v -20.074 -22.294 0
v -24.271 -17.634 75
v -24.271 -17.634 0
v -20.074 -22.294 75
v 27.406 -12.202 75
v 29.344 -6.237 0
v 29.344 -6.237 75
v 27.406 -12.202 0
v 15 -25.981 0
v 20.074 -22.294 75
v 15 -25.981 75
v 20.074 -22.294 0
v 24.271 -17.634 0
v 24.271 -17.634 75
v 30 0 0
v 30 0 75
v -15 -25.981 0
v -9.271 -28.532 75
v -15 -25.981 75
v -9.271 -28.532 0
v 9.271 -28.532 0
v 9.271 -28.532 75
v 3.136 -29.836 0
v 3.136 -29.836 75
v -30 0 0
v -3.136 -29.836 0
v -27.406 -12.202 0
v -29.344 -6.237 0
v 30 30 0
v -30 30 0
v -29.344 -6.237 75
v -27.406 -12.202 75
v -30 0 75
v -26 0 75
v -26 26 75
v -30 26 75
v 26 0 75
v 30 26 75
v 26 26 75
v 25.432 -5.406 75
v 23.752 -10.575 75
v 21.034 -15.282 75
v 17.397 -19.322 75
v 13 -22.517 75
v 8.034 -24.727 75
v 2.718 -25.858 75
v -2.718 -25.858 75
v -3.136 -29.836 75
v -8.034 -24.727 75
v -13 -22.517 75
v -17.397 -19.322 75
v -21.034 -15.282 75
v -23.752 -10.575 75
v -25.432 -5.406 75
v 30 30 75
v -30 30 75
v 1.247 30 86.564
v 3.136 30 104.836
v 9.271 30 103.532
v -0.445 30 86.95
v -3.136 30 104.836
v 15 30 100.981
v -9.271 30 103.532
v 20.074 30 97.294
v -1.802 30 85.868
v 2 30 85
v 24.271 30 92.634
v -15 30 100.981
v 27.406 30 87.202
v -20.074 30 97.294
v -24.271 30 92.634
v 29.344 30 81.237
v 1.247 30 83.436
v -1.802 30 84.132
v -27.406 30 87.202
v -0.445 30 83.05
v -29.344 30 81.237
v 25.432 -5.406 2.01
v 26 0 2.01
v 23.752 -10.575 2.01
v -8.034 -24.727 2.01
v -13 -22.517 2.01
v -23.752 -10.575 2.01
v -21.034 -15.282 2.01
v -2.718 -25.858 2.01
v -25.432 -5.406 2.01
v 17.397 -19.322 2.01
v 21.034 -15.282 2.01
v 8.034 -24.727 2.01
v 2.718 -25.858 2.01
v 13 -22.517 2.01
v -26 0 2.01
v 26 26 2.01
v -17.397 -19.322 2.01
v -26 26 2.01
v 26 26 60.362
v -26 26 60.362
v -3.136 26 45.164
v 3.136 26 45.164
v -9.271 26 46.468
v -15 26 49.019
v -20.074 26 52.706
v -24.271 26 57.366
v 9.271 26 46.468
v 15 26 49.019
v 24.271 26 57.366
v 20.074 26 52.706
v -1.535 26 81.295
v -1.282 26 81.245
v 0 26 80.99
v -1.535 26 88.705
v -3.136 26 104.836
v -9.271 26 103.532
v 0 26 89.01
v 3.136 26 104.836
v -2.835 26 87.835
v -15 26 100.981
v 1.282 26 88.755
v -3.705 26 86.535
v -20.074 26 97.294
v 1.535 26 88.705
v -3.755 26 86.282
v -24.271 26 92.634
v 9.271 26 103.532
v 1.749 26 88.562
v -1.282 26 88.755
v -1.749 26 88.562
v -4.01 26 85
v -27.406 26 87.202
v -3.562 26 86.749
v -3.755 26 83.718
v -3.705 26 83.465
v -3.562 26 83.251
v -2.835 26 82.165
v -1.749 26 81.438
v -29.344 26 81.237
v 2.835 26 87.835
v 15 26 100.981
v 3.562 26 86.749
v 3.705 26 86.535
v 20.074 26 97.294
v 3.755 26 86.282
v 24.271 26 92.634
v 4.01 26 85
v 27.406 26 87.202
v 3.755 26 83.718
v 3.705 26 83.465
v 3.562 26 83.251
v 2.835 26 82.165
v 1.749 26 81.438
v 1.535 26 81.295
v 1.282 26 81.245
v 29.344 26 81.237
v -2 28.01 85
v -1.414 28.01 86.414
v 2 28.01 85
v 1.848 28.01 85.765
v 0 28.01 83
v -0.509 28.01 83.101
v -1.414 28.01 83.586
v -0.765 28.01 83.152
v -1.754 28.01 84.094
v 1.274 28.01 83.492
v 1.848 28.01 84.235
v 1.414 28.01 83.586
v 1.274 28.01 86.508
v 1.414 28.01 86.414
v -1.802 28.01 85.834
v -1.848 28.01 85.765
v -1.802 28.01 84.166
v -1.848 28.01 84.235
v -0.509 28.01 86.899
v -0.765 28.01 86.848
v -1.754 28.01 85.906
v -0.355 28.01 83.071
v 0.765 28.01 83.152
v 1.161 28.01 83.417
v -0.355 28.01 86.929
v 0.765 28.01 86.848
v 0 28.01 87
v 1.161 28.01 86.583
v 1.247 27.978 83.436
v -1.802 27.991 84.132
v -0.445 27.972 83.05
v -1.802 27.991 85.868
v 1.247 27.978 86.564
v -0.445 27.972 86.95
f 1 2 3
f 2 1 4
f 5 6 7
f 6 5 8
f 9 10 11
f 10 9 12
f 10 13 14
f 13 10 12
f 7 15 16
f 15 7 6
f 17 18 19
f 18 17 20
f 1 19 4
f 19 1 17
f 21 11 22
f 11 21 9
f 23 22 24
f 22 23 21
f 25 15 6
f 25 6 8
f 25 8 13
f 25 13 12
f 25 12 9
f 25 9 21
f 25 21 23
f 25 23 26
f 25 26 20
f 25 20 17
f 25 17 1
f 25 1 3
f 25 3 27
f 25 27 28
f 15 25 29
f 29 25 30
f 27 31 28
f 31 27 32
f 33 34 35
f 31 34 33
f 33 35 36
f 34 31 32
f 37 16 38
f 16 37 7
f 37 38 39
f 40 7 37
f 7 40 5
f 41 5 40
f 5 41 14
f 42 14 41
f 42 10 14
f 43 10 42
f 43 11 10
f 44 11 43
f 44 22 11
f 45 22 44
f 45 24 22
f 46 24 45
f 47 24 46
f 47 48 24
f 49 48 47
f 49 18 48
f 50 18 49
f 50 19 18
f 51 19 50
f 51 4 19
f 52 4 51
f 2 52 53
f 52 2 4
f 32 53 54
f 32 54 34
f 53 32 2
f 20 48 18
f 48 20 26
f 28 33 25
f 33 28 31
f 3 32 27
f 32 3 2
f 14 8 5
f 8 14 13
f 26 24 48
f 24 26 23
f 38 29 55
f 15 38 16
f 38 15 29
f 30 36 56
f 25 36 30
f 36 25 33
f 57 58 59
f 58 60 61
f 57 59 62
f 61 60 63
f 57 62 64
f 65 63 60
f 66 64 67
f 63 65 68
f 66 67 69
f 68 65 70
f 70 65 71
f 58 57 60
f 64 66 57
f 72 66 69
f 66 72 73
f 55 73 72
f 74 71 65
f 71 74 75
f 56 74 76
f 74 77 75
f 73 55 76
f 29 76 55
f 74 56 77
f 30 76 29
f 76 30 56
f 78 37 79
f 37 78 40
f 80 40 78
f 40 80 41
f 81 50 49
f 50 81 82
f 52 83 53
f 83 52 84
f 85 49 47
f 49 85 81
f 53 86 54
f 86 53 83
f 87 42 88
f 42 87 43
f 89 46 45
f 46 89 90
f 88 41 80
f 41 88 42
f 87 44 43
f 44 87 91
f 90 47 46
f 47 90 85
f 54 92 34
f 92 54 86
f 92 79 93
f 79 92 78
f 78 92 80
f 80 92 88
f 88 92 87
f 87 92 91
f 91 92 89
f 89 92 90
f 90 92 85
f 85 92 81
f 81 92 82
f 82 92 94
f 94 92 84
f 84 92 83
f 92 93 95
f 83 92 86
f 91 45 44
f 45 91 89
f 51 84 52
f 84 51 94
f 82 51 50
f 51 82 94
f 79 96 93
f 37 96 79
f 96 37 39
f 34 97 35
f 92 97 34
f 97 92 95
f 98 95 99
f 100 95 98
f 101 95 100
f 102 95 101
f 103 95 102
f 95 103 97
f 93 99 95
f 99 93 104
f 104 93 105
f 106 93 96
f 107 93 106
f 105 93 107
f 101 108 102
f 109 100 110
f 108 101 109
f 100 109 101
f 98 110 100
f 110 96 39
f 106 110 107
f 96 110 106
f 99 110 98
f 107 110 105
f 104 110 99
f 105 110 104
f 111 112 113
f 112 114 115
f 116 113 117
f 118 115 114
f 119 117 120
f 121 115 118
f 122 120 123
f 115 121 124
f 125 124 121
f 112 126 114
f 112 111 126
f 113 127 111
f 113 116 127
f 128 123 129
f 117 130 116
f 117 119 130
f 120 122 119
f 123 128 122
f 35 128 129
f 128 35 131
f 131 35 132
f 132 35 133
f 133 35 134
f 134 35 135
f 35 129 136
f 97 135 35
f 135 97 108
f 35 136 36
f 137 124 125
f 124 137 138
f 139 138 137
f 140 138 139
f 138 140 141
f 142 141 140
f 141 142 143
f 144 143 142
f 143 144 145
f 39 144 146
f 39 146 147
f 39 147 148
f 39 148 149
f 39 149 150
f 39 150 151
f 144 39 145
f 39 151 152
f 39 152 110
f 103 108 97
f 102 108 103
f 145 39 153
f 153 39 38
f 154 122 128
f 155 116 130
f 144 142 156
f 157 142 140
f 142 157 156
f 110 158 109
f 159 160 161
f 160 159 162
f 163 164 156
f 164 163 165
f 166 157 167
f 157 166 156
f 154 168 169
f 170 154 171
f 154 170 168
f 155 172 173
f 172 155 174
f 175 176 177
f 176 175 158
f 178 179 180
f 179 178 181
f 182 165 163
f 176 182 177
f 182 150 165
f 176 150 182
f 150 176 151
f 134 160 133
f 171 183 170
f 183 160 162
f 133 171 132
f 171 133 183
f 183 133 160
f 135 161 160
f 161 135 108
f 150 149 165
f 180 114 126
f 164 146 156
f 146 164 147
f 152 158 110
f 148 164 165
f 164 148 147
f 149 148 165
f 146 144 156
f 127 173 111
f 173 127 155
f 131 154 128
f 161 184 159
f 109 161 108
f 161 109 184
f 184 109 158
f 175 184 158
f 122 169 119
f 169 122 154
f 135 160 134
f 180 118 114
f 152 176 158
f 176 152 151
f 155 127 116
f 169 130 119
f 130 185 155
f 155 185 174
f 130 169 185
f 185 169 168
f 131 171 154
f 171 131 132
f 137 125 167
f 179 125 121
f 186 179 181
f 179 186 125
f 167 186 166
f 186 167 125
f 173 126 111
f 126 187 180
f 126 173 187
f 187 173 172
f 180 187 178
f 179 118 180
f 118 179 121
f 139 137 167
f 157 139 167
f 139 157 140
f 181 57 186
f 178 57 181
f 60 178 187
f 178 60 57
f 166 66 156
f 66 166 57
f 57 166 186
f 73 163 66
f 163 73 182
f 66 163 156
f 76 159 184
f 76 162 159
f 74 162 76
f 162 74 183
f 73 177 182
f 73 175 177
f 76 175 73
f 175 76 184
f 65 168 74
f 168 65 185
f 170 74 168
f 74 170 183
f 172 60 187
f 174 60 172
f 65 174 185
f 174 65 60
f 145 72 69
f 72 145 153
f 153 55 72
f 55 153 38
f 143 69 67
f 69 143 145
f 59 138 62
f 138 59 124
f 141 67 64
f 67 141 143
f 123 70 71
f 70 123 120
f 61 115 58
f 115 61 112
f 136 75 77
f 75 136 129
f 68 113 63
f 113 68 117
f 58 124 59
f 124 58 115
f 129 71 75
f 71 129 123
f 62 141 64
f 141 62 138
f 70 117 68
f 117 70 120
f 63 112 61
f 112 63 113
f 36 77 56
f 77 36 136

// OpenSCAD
difference() {
	union() {
		cylinder(r=30, h=75);
		translate([-30,0,0])
			cube([60,30,75]);
	}
	translate([0,0,2.01])
		cylinder(r=26, h=75);
	translate([-26,0,2.01])
		cube([52,26,75]);
}


translate([0,30,75])
	rotate([90,0,0])
		difference() {
			cylinder(r=30, h=4);
			translate([0,10,-0.01]) {
				translate([0,0,2])
					cylinder(r1=2, r2=5, h=3);
				cylinder(r=2, h=4);
			}
		}
